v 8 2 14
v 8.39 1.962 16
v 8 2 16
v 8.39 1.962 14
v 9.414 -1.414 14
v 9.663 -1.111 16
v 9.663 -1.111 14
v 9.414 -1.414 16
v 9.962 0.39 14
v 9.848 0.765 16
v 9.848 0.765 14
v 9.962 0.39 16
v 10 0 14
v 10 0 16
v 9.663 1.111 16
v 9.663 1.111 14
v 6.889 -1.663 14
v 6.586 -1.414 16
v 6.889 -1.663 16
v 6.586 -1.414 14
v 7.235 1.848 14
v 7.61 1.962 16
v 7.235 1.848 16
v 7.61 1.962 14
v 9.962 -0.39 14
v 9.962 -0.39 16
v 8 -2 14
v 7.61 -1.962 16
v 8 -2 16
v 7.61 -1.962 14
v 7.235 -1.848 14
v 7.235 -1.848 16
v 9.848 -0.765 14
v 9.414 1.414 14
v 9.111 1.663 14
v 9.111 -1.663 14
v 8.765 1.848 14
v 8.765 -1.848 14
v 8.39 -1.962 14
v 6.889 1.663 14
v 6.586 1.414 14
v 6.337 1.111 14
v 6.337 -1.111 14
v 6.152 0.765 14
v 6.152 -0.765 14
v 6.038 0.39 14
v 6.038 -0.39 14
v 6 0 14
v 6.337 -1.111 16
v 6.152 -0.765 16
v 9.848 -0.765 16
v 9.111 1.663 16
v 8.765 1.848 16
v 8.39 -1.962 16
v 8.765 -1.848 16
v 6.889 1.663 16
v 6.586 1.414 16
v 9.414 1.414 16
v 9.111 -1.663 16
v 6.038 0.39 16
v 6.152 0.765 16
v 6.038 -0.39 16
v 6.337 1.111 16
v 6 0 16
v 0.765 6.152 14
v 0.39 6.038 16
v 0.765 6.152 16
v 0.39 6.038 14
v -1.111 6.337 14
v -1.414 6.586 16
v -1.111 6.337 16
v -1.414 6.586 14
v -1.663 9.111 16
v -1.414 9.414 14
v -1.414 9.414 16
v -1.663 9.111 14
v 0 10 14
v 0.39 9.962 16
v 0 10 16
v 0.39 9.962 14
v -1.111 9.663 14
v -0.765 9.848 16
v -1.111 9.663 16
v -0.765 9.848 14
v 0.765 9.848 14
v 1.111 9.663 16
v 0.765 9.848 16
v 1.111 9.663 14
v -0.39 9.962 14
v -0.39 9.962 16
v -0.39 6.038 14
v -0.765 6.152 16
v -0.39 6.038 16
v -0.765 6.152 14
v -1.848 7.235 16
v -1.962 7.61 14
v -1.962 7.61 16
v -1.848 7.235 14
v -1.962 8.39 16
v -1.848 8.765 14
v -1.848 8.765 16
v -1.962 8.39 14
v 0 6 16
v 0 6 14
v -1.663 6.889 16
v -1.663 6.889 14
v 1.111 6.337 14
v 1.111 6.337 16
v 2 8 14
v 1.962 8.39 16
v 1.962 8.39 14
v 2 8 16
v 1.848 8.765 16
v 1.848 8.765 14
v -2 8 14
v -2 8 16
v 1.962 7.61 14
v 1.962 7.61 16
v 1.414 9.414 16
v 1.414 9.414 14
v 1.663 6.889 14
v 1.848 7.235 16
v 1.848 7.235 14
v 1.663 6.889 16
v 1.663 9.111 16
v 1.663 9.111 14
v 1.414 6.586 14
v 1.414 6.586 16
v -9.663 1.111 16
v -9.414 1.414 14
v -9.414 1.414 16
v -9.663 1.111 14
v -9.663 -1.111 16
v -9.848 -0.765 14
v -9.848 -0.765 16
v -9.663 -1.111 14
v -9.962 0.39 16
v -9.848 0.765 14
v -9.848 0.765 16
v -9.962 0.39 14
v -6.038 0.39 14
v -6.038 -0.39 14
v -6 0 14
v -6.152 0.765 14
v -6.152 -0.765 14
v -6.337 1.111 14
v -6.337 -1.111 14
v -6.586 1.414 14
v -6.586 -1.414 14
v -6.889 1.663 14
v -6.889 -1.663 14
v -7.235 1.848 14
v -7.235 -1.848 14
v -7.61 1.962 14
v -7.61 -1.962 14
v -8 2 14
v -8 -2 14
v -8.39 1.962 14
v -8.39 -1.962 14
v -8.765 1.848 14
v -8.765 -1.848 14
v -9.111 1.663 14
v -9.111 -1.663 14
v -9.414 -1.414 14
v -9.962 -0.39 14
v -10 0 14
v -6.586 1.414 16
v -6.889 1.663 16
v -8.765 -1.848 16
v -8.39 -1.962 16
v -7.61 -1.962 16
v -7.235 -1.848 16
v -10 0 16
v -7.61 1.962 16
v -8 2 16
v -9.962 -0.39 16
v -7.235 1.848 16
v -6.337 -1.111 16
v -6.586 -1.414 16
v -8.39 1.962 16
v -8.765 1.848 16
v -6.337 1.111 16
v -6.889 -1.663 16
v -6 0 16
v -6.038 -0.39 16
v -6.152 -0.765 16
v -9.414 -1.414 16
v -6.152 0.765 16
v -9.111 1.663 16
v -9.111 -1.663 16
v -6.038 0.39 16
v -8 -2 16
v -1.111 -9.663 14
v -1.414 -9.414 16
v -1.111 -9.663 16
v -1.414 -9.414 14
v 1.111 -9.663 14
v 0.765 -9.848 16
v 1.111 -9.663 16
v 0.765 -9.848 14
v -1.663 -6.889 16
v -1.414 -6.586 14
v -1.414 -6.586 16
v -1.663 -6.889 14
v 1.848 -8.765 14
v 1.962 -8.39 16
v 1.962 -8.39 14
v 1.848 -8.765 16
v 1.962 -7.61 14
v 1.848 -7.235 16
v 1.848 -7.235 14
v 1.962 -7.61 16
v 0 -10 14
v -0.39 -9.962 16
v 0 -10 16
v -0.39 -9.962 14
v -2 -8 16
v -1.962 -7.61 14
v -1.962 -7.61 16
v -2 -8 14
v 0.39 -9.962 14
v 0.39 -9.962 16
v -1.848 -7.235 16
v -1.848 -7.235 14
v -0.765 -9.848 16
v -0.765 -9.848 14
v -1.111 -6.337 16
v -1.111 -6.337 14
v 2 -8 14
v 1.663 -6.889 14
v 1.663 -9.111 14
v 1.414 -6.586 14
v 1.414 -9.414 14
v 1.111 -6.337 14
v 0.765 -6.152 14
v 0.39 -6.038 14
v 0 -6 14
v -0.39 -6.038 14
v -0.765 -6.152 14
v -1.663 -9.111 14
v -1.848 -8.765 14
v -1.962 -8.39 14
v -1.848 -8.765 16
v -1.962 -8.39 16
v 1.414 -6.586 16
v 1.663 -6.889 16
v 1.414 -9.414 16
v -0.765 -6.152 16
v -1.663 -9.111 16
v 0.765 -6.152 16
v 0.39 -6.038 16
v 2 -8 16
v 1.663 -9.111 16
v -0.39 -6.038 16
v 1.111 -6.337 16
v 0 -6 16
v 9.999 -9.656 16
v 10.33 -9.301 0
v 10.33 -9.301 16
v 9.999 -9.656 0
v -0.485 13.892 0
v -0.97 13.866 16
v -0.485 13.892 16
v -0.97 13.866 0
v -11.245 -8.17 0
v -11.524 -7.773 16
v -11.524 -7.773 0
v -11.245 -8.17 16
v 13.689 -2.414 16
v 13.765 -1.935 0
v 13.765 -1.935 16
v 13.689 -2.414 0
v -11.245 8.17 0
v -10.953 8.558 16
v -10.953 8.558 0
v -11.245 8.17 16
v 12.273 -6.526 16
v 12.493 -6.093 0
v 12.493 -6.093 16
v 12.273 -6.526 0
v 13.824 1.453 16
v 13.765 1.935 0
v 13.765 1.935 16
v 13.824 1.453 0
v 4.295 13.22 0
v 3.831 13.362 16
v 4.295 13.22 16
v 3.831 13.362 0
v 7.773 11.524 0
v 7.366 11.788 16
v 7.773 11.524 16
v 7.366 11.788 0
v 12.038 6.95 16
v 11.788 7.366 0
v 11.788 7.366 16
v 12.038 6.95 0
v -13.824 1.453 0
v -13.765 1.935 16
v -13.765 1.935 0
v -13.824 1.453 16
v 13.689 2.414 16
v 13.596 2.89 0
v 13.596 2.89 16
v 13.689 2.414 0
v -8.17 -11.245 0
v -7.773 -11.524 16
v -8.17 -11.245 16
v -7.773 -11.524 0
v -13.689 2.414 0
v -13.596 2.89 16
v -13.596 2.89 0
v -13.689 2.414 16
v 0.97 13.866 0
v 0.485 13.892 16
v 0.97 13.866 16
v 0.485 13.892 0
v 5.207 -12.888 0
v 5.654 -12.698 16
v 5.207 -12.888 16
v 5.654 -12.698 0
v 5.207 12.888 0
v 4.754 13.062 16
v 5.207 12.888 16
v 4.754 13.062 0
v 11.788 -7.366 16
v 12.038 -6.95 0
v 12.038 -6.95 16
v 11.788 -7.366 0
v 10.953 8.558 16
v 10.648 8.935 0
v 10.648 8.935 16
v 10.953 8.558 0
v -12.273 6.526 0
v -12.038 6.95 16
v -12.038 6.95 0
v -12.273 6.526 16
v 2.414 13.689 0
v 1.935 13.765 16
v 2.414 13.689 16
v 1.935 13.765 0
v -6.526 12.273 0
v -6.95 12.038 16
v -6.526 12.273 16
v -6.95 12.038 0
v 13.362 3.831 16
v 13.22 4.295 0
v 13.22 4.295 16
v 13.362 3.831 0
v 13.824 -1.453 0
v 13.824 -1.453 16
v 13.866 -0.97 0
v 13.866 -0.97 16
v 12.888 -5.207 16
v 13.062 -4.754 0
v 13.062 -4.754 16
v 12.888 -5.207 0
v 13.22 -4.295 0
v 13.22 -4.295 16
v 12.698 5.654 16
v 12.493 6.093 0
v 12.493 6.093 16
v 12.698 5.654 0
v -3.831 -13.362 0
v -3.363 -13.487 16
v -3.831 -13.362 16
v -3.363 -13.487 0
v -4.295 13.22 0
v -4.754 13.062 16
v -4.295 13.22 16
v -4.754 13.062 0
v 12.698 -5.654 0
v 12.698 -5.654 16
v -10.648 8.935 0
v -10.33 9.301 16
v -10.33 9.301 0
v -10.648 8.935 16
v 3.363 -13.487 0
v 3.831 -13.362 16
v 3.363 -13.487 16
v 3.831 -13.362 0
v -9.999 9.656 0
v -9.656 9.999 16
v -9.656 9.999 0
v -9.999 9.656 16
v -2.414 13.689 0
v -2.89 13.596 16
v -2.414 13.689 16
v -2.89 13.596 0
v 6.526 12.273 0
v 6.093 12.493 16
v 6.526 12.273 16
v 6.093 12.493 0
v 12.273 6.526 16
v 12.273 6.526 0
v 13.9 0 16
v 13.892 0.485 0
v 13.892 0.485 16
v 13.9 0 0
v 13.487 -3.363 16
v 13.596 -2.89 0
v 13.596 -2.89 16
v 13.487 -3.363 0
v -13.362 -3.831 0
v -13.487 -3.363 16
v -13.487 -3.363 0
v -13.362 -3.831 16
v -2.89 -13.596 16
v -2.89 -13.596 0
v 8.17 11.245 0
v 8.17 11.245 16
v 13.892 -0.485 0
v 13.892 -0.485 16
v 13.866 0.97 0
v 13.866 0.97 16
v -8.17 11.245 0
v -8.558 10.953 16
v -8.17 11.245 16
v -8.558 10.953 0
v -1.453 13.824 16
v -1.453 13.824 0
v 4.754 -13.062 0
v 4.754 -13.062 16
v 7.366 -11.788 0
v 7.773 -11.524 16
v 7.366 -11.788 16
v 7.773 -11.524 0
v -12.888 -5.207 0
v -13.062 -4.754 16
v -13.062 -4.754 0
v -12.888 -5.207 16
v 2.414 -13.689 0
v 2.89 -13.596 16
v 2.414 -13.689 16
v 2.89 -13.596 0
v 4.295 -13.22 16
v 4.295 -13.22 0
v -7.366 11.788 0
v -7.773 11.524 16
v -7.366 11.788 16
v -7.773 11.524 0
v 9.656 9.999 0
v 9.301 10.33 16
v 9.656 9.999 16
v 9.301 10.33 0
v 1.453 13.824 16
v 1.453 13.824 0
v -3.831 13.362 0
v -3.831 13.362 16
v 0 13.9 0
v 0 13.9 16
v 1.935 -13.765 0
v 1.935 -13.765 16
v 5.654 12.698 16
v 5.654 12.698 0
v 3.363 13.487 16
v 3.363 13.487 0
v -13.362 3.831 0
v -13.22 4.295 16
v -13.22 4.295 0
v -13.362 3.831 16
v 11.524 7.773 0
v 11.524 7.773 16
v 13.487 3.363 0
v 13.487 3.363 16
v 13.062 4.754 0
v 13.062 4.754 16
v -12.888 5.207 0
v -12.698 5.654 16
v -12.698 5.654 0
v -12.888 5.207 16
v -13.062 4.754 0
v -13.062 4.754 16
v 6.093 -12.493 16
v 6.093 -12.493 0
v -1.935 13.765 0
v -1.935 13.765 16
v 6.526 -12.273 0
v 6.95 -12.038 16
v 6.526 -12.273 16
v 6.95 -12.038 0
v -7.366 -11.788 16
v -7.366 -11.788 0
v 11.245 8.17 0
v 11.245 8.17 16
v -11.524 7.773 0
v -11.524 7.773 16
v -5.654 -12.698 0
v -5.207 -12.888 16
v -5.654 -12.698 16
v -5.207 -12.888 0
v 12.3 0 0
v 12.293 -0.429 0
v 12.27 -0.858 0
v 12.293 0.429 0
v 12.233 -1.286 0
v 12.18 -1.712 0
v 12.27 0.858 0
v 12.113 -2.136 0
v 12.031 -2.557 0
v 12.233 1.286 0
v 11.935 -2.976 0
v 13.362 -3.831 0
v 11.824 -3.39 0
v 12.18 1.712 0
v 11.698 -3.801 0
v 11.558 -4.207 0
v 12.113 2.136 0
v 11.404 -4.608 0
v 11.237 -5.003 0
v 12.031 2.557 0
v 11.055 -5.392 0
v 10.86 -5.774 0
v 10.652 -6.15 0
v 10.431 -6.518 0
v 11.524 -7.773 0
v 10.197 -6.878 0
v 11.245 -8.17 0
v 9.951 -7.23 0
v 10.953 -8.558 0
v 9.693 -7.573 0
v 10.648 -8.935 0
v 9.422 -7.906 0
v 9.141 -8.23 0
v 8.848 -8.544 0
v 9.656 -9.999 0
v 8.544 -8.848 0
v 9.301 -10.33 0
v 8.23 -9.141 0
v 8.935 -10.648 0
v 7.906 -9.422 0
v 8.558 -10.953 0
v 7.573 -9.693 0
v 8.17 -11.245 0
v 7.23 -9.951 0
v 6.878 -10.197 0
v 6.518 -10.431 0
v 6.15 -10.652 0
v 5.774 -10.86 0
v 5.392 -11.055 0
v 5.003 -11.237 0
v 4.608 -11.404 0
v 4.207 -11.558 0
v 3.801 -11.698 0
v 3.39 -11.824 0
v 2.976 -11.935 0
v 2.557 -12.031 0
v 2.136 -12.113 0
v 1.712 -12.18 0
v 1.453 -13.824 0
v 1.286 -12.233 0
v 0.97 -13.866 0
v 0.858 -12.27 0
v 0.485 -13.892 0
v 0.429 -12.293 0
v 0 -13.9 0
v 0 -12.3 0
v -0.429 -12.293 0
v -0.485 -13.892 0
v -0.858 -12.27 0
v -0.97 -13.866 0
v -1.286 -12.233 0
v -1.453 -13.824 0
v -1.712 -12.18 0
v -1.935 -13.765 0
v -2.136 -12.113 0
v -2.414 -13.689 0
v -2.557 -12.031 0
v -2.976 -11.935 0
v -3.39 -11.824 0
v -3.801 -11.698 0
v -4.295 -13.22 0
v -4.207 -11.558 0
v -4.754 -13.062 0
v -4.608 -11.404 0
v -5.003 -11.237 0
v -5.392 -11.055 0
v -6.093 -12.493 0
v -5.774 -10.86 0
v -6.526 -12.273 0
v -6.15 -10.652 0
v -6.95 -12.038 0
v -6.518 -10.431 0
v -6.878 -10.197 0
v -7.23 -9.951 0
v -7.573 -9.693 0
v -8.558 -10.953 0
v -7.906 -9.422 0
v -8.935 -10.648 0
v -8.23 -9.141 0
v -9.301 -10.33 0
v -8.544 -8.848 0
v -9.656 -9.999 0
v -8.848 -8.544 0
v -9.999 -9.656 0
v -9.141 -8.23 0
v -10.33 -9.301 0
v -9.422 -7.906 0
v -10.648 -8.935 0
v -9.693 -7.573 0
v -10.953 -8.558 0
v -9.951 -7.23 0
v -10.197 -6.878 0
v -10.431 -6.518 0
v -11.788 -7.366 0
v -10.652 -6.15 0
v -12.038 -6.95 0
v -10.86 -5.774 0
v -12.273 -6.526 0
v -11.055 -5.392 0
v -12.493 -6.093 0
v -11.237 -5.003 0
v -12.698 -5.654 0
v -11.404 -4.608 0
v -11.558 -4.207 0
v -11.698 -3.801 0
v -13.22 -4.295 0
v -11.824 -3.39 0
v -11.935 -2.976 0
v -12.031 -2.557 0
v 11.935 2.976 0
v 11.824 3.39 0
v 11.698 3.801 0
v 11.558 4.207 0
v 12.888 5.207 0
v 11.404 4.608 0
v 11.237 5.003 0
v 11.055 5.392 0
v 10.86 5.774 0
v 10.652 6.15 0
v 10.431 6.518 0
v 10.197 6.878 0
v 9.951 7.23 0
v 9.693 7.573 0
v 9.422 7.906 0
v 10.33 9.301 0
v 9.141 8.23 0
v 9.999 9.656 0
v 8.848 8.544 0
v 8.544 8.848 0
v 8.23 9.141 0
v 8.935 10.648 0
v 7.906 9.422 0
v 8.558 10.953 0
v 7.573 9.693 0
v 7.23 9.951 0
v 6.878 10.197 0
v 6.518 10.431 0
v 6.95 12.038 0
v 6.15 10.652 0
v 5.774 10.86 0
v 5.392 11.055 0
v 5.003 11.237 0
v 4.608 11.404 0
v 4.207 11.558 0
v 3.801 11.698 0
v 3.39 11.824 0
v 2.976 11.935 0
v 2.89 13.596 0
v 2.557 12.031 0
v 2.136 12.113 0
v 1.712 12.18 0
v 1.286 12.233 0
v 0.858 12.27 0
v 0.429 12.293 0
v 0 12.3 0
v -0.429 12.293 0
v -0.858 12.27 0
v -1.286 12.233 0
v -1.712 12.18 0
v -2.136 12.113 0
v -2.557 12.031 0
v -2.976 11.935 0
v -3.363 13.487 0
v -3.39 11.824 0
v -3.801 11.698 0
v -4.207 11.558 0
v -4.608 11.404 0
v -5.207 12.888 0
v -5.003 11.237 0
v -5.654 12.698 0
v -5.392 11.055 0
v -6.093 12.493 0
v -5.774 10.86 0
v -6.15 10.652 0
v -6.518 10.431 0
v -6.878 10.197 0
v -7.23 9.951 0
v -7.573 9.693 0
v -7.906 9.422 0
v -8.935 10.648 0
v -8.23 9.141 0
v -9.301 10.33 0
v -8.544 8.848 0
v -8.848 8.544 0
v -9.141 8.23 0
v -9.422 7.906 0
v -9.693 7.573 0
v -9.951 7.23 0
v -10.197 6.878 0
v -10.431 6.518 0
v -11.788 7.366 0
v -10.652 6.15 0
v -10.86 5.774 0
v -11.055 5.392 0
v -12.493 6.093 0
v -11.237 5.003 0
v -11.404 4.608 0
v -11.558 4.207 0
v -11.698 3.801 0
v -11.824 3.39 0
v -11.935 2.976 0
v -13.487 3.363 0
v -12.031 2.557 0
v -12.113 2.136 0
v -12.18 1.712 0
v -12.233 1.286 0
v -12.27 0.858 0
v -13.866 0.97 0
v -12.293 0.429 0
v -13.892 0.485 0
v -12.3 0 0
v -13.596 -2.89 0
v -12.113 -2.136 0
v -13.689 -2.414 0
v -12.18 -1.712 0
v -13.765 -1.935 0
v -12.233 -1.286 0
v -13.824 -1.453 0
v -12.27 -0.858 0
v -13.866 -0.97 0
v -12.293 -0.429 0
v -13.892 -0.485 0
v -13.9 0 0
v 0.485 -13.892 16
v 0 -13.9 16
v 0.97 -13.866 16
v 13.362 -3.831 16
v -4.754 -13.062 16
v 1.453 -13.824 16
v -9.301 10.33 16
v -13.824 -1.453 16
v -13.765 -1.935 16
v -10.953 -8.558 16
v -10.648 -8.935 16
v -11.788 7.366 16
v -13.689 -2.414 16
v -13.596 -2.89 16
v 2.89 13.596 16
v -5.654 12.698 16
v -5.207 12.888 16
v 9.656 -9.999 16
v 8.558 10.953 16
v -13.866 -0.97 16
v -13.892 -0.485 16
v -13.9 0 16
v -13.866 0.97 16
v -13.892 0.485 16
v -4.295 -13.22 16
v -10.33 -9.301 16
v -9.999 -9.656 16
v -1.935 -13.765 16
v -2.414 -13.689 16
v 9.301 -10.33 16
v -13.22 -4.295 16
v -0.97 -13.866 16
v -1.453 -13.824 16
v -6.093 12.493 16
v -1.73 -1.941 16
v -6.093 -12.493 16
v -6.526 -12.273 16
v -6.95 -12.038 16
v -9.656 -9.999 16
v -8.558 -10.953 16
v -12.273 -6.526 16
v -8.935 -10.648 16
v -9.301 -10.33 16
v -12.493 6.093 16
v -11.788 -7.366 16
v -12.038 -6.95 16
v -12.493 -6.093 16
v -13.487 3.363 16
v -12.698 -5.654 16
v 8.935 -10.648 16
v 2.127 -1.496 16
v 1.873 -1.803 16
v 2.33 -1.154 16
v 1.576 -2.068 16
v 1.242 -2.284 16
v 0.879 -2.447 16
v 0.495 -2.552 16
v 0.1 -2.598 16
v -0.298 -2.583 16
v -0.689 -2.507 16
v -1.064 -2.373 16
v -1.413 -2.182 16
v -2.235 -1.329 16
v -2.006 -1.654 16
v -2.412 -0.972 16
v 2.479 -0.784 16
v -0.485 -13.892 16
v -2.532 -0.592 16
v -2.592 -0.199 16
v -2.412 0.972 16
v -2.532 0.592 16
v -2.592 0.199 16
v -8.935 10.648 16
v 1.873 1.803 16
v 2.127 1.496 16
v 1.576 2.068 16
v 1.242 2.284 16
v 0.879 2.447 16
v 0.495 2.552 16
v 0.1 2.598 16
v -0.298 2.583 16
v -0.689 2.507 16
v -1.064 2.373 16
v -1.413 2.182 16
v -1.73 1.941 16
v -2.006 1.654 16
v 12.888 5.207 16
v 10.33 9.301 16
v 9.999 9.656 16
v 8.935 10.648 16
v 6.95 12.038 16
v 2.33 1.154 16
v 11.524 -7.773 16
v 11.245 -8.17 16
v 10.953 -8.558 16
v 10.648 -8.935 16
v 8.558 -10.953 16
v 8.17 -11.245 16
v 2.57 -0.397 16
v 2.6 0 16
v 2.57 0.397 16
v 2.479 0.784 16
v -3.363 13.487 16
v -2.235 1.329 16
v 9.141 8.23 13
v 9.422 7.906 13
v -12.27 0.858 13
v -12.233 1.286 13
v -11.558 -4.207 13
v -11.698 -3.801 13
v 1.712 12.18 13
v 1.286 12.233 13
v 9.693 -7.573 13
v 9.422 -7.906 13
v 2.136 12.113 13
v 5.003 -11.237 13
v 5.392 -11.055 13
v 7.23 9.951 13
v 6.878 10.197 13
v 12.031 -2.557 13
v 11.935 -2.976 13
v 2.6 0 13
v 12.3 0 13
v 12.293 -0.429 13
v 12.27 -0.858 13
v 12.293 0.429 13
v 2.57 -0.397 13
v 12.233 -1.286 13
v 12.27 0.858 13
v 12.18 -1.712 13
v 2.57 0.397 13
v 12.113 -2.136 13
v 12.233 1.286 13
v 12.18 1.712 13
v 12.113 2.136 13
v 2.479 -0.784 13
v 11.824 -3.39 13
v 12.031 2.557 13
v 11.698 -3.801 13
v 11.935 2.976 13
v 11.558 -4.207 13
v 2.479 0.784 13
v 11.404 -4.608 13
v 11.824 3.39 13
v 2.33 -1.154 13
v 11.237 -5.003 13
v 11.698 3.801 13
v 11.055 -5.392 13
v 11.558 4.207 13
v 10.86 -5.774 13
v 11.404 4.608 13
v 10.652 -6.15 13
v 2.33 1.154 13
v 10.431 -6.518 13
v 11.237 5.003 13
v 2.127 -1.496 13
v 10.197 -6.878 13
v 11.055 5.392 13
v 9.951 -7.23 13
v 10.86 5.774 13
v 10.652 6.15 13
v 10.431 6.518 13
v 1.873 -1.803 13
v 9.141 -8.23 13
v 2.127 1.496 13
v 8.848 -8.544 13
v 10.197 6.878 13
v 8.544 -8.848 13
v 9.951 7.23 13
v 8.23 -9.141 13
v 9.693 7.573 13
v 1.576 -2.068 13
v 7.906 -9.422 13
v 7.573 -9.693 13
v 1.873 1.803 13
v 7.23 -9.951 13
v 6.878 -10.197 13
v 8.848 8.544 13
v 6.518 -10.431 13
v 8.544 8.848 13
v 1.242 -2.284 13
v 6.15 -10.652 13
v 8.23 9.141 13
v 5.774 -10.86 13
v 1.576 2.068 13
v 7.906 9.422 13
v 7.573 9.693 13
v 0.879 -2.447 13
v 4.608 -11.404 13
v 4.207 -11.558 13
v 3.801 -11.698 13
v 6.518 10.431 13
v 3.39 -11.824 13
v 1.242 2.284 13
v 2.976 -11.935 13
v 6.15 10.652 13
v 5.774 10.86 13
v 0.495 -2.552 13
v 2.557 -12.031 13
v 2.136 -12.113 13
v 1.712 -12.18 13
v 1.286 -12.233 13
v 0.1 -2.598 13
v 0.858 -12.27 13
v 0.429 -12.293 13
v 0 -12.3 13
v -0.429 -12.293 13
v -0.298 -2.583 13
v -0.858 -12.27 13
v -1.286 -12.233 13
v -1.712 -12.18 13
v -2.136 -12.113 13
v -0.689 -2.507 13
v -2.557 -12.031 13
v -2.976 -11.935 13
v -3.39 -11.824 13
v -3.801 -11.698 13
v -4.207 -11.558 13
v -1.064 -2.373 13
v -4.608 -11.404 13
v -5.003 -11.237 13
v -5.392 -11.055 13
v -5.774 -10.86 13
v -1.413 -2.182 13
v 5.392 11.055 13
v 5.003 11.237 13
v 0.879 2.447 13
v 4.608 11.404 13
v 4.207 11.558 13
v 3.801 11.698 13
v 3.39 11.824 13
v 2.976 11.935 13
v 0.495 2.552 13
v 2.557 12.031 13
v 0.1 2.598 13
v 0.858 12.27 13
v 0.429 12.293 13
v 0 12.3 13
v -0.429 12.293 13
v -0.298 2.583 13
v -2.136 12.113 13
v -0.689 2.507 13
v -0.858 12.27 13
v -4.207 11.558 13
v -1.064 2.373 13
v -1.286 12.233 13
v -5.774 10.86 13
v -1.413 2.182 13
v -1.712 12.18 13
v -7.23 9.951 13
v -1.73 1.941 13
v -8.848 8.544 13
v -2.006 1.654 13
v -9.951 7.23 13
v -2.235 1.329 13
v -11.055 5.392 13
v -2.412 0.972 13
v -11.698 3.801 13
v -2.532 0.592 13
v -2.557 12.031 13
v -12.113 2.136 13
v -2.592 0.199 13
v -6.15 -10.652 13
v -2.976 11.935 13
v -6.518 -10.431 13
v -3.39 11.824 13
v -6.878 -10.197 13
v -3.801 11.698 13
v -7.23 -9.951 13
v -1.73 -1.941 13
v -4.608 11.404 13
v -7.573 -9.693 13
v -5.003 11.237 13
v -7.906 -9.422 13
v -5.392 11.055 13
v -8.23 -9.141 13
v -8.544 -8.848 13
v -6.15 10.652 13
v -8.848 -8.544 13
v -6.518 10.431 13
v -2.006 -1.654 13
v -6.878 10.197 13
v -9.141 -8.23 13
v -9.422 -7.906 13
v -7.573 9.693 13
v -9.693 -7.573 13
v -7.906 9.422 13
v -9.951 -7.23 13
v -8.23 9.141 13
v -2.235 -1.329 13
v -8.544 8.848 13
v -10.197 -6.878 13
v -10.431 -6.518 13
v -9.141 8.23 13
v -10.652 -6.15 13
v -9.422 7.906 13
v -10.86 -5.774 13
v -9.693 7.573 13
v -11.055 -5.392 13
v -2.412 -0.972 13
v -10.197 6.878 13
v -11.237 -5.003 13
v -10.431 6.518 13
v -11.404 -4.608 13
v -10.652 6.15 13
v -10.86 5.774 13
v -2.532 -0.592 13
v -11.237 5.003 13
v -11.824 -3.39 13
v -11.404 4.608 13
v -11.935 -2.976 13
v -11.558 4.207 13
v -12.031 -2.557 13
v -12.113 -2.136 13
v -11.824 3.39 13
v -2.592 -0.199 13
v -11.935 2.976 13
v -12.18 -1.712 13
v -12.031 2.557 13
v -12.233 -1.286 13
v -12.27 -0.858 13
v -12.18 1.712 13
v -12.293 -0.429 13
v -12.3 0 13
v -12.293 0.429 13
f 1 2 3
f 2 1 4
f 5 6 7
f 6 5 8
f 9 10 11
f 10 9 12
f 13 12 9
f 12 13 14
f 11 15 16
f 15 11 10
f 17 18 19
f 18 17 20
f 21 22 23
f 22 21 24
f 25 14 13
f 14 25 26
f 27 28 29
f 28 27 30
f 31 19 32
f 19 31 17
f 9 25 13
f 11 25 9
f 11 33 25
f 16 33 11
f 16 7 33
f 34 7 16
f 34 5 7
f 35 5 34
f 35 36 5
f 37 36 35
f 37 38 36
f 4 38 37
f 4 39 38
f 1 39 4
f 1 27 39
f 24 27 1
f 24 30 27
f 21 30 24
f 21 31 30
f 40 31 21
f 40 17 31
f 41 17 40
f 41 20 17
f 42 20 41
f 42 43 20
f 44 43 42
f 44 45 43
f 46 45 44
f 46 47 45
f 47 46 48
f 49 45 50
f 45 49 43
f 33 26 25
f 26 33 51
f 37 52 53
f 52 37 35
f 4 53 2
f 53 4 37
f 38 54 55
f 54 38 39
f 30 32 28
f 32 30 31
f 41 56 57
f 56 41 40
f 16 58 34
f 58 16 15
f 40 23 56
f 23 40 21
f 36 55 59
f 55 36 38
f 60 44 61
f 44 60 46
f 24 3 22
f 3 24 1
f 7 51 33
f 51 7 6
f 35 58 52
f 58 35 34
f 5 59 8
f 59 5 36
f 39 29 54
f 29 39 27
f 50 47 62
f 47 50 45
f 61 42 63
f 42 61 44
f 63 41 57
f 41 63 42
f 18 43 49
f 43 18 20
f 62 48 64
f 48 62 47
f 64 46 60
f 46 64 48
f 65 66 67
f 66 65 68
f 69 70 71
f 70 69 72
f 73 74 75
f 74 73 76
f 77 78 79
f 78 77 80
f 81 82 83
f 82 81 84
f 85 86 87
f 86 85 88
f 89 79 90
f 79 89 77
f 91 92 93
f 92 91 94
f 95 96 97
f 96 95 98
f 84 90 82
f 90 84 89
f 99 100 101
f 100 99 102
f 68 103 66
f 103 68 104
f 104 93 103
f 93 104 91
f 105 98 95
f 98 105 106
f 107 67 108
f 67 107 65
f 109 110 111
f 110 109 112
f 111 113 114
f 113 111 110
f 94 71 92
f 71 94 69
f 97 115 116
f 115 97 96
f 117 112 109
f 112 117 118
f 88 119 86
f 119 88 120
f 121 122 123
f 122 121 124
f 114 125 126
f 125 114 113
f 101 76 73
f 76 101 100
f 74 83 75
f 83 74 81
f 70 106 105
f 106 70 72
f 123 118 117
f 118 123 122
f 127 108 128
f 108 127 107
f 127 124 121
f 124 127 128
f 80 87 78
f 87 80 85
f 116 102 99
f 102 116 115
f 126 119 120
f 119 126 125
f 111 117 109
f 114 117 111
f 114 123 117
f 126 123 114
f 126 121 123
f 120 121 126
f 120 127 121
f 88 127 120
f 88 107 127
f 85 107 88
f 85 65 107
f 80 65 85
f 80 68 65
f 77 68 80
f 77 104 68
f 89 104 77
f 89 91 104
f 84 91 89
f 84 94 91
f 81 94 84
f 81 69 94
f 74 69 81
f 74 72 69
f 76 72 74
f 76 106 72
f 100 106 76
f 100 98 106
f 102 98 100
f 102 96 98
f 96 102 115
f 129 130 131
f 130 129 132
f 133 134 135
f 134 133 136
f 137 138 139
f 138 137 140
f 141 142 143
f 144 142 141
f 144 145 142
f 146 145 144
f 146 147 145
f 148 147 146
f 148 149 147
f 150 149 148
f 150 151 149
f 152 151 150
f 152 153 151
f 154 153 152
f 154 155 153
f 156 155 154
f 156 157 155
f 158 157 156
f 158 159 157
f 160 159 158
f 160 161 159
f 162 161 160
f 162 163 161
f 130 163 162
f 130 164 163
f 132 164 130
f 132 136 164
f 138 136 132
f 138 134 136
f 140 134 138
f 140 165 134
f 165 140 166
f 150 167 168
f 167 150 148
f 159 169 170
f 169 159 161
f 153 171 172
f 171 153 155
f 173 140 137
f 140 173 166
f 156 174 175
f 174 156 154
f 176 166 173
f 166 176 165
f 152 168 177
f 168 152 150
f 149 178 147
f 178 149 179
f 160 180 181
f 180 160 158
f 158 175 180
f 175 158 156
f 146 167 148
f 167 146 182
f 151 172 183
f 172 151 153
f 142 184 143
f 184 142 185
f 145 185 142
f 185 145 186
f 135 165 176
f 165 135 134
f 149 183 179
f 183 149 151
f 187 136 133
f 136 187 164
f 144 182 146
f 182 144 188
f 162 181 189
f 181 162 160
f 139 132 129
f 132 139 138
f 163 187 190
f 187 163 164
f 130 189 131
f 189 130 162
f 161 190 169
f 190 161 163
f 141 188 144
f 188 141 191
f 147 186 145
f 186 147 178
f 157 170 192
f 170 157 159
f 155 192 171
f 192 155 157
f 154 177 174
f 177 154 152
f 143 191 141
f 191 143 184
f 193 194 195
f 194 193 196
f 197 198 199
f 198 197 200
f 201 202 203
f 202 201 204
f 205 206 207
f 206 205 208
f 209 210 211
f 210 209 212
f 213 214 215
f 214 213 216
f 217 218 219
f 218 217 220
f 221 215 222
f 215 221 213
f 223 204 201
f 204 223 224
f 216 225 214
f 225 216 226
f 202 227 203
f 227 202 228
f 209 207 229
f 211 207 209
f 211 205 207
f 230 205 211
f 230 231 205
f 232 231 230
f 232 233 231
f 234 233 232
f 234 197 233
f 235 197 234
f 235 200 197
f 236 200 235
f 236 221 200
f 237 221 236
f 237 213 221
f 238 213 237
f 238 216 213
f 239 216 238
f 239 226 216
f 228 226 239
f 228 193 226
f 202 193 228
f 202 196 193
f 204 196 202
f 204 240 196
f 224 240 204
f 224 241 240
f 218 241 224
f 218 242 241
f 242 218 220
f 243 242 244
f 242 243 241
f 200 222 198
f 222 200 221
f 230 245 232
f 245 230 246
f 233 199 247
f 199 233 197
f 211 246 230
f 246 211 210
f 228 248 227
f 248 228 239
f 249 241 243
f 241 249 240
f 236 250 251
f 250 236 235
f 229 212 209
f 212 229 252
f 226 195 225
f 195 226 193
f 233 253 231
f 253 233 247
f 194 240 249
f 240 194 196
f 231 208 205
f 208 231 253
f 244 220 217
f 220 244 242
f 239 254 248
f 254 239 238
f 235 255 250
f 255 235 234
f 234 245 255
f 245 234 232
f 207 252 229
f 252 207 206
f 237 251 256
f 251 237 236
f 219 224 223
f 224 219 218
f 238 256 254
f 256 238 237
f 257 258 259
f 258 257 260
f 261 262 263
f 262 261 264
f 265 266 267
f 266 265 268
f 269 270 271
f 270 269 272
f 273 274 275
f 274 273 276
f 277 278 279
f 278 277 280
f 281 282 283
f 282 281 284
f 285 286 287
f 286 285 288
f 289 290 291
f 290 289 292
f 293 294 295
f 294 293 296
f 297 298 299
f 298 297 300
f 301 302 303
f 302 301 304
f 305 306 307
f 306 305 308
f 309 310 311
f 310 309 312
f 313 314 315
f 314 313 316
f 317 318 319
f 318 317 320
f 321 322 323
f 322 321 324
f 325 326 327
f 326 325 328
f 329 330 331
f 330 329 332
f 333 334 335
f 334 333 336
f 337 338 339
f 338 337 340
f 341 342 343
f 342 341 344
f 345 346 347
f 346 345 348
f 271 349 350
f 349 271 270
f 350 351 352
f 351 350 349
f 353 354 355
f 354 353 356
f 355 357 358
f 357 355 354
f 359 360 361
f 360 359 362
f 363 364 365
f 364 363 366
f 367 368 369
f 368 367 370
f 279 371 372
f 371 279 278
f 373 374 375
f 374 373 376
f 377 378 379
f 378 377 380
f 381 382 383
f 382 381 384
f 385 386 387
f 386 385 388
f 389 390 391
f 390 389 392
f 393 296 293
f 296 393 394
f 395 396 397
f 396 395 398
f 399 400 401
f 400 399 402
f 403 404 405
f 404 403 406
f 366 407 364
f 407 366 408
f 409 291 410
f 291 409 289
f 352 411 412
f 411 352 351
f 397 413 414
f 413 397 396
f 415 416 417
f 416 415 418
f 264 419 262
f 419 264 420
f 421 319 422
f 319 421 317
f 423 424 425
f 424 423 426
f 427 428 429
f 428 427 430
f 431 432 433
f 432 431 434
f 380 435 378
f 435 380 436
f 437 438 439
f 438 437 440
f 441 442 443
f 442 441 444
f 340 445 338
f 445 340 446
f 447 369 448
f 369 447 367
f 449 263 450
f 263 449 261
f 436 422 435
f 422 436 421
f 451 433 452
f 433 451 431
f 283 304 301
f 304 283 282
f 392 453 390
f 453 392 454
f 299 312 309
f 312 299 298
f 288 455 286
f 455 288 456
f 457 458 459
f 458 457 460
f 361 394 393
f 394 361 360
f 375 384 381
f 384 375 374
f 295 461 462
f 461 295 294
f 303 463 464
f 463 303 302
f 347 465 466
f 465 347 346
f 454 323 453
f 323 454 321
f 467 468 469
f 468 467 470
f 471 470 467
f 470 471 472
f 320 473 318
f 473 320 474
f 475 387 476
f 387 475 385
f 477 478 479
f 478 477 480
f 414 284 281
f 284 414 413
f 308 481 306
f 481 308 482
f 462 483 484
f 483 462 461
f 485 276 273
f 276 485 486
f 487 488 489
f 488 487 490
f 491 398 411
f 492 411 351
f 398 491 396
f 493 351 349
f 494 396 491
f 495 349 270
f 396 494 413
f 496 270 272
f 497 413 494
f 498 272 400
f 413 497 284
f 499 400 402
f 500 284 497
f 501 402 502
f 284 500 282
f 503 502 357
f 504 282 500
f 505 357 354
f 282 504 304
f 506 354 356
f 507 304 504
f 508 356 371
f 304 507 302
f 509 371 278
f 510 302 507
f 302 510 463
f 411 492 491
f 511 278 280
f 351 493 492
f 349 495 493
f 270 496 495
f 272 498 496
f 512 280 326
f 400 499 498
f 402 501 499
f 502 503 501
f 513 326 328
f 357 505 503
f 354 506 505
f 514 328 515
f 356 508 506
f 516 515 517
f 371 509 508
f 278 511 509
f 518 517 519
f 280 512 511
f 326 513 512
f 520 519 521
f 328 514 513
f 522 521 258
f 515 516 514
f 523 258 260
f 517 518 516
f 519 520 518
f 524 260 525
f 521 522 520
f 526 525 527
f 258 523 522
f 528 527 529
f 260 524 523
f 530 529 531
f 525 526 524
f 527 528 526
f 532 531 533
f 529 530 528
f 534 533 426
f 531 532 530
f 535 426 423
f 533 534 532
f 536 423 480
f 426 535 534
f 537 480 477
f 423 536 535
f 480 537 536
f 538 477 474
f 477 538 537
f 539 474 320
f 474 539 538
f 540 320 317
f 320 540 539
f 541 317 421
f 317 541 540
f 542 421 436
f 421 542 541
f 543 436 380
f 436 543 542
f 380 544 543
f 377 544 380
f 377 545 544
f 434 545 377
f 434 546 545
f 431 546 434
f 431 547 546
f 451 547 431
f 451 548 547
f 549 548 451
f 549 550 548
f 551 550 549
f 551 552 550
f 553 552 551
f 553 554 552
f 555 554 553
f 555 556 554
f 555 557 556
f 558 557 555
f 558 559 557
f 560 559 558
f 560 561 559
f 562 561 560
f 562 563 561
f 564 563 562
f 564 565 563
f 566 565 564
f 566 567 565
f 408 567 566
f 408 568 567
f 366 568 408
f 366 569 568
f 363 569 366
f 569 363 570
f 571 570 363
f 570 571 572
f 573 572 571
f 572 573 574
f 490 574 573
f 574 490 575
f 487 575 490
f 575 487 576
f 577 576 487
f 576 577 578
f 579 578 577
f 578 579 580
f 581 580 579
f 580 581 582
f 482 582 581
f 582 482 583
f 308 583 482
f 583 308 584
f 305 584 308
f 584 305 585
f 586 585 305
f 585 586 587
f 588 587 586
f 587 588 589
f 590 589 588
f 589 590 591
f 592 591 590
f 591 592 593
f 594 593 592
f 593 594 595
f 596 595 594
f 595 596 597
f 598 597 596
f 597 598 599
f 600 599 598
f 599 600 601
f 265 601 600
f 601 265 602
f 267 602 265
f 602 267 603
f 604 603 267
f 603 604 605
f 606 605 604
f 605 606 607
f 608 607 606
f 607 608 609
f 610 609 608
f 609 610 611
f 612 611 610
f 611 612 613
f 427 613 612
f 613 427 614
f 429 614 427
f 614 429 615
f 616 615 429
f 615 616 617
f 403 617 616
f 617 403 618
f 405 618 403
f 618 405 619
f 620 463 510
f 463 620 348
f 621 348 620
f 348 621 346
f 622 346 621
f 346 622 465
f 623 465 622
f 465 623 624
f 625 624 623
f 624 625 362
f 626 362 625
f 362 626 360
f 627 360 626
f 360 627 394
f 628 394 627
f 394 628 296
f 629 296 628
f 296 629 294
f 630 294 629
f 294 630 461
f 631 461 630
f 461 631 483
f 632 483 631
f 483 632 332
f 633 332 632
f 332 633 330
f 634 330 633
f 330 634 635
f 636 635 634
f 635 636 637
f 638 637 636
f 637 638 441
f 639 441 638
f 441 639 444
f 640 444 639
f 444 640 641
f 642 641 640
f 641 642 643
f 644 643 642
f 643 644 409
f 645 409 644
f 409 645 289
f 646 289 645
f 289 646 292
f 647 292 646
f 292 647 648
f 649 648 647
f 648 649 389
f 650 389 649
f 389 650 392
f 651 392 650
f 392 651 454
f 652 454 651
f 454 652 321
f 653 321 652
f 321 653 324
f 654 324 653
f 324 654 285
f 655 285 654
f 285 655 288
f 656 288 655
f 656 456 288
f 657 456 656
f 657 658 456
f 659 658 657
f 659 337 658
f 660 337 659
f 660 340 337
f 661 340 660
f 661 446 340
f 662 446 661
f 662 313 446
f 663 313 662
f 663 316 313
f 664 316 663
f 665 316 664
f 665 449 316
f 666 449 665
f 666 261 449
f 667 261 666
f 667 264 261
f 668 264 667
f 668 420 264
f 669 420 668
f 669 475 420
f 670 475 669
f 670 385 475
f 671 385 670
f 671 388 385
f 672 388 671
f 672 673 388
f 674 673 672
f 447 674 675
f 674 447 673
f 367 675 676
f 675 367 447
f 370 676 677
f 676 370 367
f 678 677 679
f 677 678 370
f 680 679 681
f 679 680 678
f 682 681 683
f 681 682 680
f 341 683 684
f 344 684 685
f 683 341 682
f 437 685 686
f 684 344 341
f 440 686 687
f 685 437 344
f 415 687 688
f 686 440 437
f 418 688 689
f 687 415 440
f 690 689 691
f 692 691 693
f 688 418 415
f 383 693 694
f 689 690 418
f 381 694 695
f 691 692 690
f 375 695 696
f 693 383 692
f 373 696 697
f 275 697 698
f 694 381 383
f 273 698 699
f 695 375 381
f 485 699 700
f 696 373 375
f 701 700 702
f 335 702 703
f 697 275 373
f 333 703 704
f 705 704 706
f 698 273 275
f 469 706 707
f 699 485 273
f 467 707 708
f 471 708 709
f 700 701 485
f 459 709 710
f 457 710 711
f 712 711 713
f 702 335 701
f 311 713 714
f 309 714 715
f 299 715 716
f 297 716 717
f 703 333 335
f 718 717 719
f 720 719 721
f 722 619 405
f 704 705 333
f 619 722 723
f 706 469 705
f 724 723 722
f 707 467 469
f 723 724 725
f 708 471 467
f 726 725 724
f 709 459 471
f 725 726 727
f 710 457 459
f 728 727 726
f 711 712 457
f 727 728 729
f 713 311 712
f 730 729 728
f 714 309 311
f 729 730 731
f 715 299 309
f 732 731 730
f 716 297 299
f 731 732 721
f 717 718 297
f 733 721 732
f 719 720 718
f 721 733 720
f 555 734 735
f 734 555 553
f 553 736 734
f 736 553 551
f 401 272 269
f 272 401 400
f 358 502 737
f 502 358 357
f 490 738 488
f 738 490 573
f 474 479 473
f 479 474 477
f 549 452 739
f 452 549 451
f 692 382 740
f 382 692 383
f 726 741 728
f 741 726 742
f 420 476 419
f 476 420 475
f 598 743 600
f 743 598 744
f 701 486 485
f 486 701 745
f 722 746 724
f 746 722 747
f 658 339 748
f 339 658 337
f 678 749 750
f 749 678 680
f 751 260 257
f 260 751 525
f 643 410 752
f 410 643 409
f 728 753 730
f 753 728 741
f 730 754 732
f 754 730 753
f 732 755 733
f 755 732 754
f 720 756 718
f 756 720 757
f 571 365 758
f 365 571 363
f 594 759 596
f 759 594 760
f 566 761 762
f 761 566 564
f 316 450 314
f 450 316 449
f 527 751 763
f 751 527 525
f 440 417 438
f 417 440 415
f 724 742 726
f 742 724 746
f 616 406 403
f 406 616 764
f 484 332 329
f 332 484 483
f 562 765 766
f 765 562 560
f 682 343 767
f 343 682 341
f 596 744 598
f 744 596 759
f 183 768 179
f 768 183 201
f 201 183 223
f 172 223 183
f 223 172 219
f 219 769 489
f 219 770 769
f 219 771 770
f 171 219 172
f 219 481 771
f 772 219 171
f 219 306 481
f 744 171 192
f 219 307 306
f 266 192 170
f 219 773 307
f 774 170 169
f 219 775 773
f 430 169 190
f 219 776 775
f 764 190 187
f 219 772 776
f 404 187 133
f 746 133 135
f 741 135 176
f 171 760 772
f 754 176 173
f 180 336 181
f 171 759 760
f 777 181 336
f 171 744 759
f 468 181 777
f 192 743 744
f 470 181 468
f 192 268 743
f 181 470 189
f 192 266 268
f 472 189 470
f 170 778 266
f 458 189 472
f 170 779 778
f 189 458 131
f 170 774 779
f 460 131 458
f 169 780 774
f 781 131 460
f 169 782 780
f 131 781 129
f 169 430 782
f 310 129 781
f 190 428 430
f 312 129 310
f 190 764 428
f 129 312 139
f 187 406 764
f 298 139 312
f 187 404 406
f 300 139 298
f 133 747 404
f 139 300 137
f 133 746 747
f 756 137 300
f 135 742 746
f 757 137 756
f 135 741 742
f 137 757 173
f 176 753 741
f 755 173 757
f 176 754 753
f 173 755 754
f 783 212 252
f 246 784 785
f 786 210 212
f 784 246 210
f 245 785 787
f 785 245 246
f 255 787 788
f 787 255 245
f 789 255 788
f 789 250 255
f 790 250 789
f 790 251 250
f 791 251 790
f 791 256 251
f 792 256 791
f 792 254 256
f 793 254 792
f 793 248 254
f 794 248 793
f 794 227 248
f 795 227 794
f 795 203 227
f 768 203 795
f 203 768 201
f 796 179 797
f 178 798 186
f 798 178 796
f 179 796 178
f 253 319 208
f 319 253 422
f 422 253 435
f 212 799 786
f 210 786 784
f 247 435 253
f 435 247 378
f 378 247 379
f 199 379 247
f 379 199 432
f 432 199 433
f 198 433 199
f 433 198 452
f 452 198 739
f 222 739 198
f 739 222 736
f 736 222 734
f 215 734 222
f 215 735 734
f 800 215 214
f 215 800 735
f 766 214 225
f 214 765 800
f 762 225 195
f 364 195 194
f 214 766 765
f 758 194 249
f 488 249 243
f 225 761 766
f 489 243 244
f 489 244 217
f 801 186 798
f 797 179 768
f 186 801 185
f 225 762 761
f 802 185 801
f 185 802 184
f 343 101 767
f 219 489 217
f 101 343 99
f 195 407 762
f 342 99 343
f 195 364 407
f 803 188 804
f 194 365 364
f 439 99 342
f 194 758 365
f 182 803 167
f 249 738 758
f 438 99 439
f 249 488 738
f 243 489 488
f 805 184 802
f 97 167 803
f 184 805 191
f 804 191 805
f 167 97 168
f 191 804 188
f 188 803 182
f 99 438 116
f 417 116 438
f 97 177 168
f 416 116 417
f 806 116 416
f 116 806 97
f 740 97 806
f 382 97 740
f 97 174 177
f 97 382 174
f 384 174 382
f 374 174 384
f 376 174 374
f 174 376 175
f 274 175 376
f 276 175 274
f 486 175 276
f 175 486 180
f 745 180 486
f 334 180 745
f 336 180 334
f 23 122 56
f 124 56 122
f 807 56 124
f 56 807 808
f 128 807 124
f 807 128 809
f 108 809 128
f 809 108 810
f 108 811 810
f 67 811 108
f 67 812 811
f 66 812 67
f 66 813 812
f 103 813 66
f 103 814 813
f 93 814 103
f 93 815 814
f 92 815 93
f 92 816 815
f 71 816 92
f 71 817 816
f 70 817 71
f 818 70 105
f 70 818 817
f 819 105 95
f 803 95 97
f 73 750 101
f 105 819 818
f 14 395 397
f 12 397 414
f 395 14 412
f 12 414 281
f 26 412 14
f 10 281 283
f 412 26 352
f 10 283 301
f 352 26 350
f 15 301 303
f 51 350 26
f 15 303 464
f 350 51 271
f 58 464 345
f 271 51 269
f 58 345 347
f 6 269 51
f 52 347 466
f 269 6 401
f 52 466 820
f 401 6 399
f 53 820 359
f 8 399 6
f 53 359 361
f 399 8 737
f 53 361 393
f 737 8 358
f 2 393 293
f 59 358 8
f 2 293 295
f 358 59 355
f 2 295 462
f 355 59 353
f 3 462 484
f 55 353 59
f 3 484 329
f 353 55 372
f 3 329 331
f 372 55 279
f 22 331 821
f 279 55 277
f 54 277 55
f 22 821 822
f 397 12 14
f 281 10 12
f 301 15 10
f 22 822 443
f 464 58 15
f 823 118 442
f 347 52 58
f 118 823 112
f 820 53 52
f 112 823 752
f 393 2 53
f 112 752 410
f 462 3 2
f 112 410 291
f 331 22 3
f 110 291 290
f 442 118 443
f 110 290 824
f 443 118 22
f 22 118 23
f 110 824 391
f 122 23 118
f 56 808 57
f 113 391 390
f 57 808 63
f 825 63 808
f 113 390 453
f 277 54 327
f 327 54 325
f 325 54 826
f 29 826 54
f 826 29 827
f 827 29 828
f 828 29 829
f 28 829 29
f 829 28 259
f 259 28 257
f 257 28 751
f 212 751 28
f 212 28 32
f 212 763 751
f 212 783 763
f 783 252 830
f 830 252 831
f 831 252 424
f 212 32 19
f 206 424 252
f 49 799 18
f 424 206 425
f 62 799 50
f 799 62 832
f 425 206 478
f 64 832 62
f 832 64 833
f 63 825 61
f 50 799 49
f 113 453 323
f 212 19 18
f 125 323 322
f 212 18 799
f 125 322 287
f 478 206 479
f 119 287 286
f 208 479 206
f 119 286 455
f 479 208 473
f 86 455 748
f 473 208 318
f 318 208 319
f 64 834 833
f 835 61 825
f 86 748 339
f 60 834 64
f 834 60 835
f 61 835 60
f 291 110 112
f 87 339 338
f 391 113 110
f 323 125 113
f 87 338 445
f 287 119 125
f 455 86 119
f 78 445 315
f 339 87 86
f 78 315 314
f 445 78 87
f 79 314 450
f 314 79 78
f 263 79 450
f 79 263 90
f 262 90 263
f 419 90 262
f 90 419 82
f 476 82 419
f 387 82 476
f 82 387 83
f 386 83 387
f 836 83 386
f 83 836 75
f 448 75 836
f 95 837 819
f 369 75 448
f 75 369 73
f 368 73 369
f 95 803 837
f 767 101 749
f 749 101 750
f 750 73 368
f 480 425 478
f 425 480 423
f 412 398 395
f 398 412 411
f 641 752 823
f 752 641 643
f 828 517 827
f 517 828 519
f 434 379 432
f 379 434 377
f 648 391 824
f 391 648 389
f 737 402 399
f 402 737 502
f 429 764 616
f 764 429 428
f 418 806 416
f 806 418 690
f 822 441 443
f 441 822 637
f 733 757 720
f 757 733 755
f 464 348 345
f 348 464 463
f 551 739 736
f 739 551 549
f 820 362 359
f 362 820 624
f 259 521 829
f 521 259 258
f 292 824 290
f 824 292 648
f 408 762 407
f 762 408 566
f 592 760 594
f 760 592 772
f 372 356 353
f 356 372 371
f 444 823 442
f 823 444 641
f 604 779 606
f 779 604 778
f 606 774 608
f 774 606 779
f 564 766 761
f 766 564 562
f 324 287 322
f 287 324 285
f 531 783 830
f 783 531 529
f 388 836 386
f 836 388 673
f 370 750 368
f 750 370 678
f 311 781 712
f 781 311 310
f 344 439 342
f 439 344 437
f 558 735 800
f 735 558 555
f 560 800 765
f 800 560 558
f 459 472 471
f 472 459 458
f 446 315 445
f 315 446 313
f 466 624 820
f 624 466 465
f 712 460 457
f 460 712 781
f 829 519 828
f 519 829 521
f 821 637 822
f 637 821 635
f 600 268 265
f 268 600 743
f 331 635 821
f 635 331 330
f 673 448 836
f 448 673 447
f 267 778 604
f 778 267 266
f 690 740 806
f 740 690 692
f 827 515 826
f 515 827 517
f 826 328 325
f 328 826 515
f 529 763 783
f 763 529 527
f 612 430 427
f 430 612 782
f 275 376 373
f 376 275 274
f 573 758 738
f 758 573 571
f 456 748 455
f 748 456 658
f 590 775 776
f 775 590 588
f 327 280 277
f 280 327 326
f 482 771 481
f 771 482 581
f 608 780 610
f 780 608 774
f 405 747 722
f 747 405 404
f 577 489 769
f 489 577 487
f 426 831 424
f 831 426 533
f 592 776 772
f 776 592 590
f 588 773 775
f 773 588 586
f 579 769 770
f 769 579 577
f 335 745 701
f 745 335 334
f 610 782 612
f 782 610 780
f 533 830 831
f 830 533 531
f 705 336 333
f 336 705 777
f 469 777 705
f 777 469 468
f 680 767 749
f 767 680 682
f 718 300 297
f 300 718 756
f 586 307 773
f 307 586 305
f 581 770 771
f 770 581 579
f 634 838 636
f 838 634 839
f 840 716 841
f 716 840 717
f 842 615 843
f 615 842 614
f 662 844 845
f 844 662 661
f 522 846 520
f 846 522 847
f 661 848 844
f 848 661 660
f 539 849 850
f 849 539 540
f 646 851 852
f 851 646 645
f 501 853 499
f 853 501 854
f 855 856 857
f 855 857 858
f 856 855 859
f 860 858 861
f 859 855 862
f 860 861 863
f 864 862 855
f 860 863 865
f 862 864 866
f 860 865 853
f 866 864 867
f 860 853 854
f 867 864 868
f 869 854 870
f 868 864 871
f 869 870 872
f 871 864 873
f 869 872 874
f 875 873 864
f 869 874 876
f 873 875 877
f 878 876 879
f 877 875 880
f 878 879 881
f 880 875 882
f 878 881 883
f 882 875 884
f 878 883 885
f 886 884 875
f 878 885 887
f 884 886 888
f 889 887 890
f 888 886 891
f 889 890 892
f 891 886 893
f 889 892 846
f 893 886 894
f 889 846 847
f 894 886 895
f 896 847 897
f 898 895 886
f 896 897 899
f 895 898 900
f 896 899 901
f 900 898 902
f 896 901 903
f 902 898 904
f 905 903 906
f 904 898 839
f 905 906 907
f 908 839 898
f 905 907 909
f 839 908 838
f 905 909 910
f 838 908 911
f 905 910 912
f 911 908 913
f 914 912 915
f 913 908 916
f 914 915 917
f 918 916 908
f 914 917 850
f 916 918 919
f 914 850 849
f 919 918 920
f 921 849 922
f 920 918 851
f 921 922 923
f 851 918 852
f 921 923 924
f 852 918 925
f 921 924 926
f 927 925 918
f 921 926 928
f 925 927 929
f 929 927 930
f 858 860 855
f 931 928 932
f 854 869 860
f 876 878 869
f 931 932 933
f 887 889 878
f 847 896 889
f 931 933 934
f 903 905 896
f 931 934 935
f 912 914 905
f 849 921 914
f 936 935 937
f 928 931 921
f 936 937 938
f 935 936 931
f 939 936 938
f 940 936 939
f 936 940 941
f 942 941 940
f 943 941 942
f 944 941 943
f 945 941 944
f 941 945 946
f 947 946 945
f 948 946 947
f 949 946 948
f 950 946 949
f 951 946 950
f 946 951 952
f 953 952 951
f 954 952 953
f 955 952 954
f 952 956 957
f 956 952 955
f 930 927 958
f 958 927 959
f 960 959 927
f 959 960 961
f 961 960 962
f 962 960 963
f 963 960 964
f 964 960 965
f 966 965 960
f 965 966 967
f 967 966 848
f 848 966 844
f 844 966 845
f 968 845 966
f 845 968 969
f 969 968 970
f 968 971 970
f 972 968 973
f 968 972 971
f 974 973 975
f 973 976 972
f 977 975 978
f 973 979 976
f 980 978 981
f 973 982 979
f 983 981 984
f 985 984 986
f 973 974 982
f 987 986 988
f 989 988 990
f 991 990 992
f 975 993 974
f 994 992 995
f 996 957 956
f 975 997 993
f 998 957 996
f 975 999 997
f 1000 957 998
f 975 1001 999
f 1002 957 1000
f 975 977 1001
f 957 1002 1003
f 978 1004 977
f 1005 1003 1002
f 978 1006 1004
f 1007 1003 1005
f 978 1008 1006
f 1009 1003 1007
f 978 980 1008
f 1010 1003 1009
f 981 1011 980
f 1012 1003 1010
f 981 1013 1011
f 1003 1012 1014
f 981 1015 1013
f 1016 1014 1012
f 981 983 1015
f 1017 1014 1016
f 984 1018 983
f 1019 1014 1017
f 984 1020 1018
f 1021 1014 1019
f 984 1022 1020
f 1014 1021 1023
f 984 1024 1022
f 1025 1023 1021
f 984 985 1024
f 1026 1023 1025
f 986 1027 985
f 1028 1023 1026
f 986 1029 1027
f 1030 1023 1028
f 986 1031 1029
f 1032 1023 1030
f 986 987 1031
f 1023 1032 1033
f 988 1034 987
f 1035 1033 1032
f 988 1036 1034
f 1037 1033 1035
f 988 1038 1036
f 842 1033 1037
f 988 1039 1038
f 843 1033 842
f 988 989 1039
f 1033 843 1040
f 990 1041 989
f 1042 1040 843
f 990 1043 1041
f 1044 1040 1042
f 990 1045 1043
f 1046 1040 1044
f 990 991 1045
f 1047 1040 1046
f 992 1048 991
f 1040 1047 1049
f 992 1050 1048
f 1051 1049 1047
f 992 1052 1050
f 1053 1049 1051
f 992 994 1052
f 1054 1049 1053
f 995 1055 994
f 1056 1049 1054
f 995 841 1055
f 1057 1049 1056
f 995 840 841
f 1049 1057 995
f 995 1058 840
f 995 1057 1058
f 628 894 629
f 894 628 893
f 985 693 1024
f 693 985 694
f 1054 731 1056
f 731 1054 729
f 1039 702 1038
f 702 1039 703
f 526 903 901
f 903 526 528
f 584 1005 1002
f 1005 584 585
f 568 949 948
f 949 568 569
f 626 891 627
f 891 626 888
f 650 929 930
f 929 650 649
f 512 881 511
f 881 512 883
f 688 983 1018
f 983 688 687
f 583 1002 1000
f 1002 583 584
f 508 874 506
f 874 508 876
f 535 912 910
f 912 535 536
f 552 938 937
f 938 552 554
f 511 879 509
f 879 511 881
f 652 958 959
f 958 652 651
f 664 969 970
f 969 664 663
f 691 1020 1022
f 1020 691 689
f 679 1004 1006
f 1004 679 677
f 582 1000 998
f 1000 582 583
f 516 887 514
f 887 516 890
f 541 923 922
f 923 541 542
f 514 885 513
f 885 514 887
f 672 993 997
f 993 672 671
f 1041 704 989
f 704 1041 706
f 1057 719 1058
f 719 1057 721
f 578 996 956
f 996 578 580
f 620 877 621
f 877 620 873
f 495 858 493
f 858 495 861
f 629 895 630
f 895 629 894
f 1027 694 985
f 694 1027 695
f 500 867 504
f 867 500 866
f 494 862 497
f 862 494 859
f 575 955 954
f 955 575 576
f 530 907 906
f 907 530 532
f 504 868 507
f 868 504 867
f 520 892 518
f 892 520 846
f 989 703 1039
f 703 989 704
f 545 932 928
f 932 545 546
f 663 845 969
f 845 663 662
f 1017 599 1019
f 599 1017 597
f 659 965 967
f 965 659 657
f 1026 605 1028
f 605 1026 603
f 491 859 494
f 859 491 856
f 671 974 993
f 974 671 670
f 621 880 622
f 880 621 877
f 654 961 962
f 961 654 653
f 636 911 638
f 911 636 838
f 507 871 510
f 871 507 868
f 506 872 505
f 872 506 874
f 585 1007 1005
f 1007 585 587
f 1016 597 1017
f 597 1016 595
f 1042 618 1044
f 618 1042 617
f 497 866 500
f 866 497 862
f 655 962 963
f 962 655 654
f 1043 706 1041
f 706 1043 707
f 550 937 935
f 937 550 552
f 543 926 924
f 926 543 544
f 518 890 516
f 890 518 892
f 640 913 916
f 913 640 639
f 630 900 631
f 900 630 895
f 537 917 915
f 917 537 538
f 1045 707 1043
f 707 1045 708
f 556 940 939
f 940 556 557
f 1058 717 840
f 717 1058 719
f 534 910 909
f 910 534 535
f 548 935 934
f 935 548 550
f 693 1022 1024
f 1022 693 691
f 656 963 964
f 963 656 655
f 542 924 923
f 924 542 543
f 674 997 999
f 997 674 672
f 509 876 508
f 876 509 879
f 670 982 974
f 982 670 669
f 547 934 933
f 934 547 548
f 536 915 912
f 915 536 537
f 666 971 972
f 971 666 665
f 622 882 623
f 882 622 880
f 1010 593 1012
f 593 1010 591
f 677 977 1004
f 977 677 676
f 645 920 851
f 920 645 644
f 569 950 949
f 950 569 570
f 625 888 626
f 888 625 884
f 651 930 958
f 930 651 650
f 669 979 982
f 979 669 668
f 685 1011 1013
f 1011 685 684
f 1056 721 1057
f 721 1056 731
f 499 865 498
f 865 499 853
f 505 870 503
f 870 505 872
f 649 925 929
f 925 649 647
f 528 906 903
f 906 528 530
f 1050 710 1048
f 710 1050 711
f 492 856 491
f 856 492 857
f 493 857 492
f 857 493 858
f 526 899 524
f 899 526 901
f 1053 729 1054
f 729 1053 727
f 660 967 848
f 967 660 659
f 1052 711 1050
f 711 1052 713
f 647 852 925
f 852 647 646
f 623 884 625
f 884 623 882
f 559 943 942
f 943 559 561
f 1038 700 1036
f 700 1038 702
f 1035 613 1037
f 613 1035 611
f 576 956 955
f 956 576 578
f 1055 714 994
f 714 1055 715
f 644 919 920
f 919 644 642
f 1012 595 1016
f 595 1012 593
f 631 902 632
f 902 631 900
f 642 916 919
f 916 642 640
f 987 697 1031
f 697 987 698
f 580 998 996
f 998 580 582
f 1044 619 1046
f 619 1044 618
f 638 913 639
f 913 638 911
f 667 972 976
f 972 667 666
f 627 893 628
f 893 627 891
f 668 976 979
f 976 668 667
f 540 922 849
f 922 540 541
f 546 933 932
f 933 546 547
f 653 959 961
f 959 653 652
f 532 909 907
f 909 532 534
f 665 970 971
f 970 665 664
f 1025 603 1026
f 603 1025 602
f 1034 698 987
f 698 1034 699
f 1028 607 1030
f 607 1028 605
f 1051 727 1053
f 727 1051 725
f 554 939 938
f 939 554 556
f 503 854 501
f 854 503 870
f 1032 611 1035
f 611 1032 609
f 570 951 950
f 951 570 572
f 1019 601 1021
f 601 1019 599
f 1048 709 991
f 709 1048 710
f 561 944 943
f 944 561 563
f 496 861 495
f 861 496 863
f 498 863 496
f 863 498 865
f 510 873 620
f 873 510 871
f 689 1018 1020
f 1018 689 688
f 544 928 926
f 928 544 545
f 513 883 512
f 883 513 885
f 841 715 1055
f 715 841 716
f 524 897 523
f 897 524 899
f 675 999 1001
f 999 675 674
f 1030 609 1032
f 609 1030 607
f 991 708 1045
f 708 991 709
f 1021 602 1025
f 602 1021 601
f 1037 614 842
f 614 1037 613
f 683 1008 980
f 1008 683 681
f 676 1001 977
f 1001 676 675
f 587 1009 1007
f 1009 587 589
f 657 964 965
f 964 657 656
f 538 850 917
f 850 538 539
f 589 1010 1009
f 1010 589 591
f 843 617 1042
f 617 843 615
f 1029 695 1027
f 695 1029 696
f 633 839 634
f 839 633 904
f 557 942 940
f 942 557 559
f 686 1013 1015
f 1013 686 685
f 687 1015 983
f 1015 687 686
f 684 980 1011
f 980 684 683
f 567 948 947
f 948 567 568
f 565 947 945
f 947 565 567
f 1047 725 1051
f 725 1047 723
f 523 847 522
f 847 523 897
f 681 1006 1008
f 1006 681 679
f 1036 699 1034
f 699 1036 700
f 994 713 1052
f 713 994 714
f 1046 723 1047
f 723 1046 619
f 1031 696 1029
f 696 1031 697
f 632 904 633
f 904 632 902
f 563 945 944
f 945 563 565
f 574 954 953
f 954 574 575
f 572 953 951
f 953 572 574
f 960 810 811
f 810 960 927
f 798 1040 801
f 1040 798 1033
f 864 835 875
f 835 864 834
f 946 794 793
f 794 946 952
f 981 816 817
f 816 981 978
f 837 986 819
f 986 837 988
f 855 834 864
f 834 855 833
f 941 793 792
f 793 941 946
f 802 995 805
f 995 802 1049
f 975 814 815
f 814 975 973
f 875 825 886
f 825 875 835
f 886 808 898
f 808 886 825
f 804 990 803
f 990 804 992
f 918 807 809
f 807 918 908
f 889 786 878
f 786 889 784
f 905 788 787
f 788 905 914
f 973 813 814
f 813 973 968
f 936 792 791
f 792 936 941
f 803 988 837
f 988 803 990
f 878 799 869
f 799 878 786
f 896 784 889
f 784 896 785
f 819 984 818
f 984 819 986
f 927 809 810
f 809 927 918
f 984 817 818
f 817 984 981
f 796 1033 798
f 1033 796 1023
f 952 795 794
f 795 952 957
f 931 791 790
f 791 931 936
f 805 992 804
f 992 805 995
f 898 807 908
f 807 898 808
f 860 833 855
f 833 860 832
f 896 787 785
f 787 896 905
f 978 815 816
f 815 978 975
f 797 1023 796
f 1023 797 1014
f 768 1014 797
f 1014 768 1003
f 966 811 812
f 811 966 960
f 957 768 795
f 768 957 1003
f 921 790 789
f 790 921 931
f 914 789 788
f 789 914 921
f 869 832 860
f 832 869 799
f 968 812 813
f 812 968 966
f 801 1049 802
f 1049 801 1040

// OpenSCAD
$fa = 2;
$fs = 0.4;

module motor_bell() {
  color("#c0c4c8")
    difference() {
      cylinder(h = 16, d = 27.8);
      translate([0, 0, -0.2])
        cylinder(h = 13.2, d = 24.6);
      translate([0, 0, -1])
        cylinder(h = 20, d = 5.2);
      for (a = [0:90:270])
        rotate([0, 0, a])
          translate([8, 0, 14])
            cylinder(h = 4, d = 4);
    }
}

motor_bell();
